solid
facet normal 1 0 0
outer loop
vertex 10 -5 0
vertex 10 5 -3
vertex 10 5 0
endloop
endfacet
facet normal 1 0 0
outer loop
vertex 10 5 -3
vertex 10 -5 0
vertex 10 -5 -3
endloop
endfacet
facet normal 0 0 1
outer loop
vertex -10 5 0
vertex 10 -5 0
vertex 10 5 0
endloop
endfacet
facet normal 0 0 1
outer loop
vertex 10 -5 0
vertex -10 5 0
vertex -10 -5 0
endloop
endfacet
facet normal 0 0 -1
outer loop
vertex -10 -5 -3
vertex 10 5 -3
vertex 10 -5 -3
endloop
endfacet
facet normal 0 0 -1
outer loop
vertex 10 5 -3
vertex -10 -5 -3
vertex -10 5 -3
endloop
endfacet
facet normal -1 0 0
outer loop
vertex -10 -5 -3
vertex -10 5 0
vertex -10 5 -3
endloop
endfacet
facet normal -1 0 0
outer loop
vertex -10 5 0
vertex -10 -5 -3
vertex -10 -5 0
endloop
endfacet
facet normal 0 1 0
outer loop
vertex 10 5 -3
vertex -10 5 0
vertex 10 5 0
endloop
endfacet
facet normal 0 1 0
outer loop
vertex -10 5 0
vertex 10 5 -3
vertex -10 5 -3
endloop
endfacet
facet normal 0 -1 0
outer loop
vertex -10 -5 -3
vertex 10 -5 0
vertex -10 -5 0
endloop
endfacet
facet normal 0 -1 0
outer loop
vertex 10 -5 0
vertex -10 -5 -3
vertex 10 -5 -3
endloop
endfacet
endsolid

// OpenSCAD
//include <SLEEK_Crown_Sandwich.scad>;
ROUNDING = true;
detail = 120; // decrease to speed up rendering

/*

chip_x = 22;
chip_y = 33;
chip_z = 2;
top_plate_front_curvature = 1;
top_plate_back_curvature = 0;
ring_front_curvature = 15;
ring_back_curvature = 0;
ring_width = 6;
ring_height = chip_x;
ring_position = 8;
ring_curvature = chip_x / 2;
finger_diameter = 18;
*/
//rotate([270,0,270])
//translate([20 - 55, -chip_y/2, 45 - 10])

//translate([10,0,0])
//ringster(20,18,2,1,0,15,0,6,22,8,11,18);
/*
ringster(
    20, //chip_x
    22, //chip_y
    2,  //chip_z
    2,  //top_plate_front_curvature
    0,  //top_plate_back_curvature
    13, //ring_front_curvature
    13, //ring_back_curvature
    -8, //ring_width
    22, //ring_height
    12, //ring_position
    11, //ring_curvature
    18  //finger_diameter
);
*/
chip_x = 20;
chip_y = 10;
chip_z = 3;
ring_height = 20;
ring_width = 3;
ring_curvature = 10;
ring_position = 0;
ring_front_curvature = 0;
ring_back_curvature = 0;
finger_diameter = 18;
top_plate_front_curvature = 0;
top_plate_back_curvature = 0;
bottom_separation = 4;


//ring_cutout(chip_x, chip_y, chip_z, ring_position, ring_height, ring_width,         ring_front_curvature, ring_back_curvature);

ringster(chip_x, chip_y, chip_z, top_plate_front_curvature, top_plate_back_curvature, ring_front_curvature, ring_back_curvature, ring_width, ring_height, ring_position, ring_curvature, finger_diameter, bottom_separation);



//        ring_element(chip_x, chip_y, chip_z, ring_height, ring_curvature);


//ring(chip_x, chip_y, chip_z, ring_height, ring_width, ring_curvature, ring_position, ring_front_curvature, ring_back_curvature, finger_diameter) ;

//ring(20, 18, -5, 20, 7, 10, 3.5, 5, 5, 18);
//ring_element(20, 22, 2, 22, 11);
//ring_cutout(16, 25, 0, 12, 20, 3, 13, 8);

//ring_cutout(chip_x, chip_y, chip_z, ring_position, ring_height, ring_width,  ring_front_curvature, ring_back_curvature)
//module ring(chip_x, chip_y, chip_z, ring_height, ring_width, ring_curvature, ring_position, ring_front_curvature, ring_back_curvature, finger_diameter) 




module ringster(chip_x, chip_y, chip_z, top_plate_front_curvature, top_plate_back_curvature, ring_front_curvature, ring_back_curvature, ring_width, ring_height, ring_position, ring_curvature, finger_diameter, bottom_separation)
{
    difference() {
        translate([0, 0, - chip_z / 2]) //place on floor
            union()
            {
                top_plate(chip_x, chip_y, chip_z, top_plate_back_curvature, top_plate_front_curvature);
                ring(chip_x, chip_y, chip_z, ring_height, ring_width, ring_curvature, ring_position, ring_front_curvature, ring_back_curvature, finger_diameter);
            }
            bottom_separator(chip_z, ring_height, ring_width, bottom_separation);
    }
}

module bottom_separator(chip_z, ring_height, ring_width, bottom_separation) {
    translate([0,0, - chip_z -  ring_height])
        cube([bottom_separation,ring_width + 1,ring_height], true);
}

module ring(chip_x, chip_y, chip_z, ring_height, ring_width, ring_curvature, ring_position, ring_front_curvature, ring_back_curvature, finger_diameter) 
{
    difference()
    {
        ring_element(chip_x, chip_y, chip_z, ring_height, ring_curvature);
        ring_cutout(chip_x, chip_y, chip_z, ring_position, ring_height, ring_width,         ring_front_curvature, ring_back_curvature);
        ring_hole_cutout(chip_y, chip_z, ring_height, finger_diameter);
    }
}

//thin disk just inside the ring hole
module ring_incision(chip_x, chip_z, ring_position, ring_width, finger_diameter)
{
    rotate([90,0,0])
    translate([0, - chip_x / 2 - chip_z / 2, ring_position - ring_width / 2 - 18])
    difference()
    {
        cylinder(1, finger_diameter / 2 + 0.5, finger_diameter / 2 + 0.5, false, $fn=detail);
    }
}

//long cylinder piercing the base block
module ring_hole_cutout(chip_y, chip_z, ring_height, finger_diameter)
{
    rotate([90,0,0])
    translate([
        0, 
        - chip_z / 2 - ring_height / 2,  
        - chip_y / 2 - 1
    ])
    cylinder(chip_y + 2, finger_diameter / 2, finger_diameter / 2, false, $fn=detail);
}

//base block chunk to be carved
module ring_element(chip_x, chip_y, chip_z, ring_height, ring_curvature)
{
    translate([0, 0, - chip_z / 2 - ring_height / 2])
    rotate([0,0,90])
    both_sided_spade(chip_y, chip_x, ring_height, ring_curvature); //why use spade? Just cube would work
}

//cut out the space in front of and behind what will become the ring
module ring_cutout(chip_x, chip_y, chip_z, ring_position, ring_height, ring_width,  ring_front_curvature, ring_back_curvature)
{
    //front
    translate([0,-chip_y,0])
    union() {
    rotate([0,180,0])
    translate([
        0,
        -chip_y -ring_position , // - 5 for a bit of extra margin
        ring_height / 2 + chip_z / 2
        ])
    both_sided_spade(
        chip_x + 1, 
        chip_y + 10, // translated - 5, so y is * -2
        ring_height + 1,
        ring_front_curvature
    );
    
    //back
    rotate([0,180,0])
    translate([
        0,
        -chip_y / 2 -ring_position + chip_y + ring_width + 5, // + 5 for extra margin in case ring shifted too much
        ring_height / 2 + chip_z / 2
        ])
    both_sided_spade(
        chip_x + 1, 
        chip_y + 10, // translated + 5, so y is * 2
        ring_height + 1, 
        ring_back_curvature
        );
    }
}

//Mount the microcontroller atop this
module top_plate(chip_x, chip_y, chip_z, top_plate_back_curvature, top_plate_front_curvature)
{
    intersection()
    {
        spade(chip_x, chip_y, chip_z, top_plate_back_curvature);
        rotate([0,0,180])
        spade(chip_x, chip_y, chip_z, top_plate_front_curvature);
    }
}


//A thing that is shaped like U
module both_sided_spade(x, y, z, rounding)
{
    intersection()
    {
        spade(x, y, z, rounding);
        rotate([0,0,180])
        spade(x, y, z, rounding);
    }
}

//make sure rounding is smaller than all x, y, z, or unexpected things may happen
//rounding appears along edge at +y, -z
module spade(x, y, z, rounding)
{
    translate([-x/2, -y/2, -z/2])
    {
        union()
        {
            cube([x, y - min(rounding, z), min(rounding, z)], false);
            translate([0, 0, min(rounding, z)])
            cube([x, y, z - min(rounding, z)], false);
            
            union()
            {
                intersection()
                {
                    cube([x, y, z], false);
                    translate([x / 2, y - rounding, min(rounding, z)])
                    rotate([0,90,0])
                    cylinder(x, rounding, rounding, true, $fn=detail);

                }
                if(!ROUNDING) {
                    translate([x, y - rounding, min(rounding, z)])
                    rotate([0,90,90])
                    cube([z - rounding, x, rounding]);
                }
                translate([0, y - min(rounding, z), min(rounding, z)])
                cube([x, min(rounding, z), z - min(rounding, z)], false);
            }
        }
    }
}
